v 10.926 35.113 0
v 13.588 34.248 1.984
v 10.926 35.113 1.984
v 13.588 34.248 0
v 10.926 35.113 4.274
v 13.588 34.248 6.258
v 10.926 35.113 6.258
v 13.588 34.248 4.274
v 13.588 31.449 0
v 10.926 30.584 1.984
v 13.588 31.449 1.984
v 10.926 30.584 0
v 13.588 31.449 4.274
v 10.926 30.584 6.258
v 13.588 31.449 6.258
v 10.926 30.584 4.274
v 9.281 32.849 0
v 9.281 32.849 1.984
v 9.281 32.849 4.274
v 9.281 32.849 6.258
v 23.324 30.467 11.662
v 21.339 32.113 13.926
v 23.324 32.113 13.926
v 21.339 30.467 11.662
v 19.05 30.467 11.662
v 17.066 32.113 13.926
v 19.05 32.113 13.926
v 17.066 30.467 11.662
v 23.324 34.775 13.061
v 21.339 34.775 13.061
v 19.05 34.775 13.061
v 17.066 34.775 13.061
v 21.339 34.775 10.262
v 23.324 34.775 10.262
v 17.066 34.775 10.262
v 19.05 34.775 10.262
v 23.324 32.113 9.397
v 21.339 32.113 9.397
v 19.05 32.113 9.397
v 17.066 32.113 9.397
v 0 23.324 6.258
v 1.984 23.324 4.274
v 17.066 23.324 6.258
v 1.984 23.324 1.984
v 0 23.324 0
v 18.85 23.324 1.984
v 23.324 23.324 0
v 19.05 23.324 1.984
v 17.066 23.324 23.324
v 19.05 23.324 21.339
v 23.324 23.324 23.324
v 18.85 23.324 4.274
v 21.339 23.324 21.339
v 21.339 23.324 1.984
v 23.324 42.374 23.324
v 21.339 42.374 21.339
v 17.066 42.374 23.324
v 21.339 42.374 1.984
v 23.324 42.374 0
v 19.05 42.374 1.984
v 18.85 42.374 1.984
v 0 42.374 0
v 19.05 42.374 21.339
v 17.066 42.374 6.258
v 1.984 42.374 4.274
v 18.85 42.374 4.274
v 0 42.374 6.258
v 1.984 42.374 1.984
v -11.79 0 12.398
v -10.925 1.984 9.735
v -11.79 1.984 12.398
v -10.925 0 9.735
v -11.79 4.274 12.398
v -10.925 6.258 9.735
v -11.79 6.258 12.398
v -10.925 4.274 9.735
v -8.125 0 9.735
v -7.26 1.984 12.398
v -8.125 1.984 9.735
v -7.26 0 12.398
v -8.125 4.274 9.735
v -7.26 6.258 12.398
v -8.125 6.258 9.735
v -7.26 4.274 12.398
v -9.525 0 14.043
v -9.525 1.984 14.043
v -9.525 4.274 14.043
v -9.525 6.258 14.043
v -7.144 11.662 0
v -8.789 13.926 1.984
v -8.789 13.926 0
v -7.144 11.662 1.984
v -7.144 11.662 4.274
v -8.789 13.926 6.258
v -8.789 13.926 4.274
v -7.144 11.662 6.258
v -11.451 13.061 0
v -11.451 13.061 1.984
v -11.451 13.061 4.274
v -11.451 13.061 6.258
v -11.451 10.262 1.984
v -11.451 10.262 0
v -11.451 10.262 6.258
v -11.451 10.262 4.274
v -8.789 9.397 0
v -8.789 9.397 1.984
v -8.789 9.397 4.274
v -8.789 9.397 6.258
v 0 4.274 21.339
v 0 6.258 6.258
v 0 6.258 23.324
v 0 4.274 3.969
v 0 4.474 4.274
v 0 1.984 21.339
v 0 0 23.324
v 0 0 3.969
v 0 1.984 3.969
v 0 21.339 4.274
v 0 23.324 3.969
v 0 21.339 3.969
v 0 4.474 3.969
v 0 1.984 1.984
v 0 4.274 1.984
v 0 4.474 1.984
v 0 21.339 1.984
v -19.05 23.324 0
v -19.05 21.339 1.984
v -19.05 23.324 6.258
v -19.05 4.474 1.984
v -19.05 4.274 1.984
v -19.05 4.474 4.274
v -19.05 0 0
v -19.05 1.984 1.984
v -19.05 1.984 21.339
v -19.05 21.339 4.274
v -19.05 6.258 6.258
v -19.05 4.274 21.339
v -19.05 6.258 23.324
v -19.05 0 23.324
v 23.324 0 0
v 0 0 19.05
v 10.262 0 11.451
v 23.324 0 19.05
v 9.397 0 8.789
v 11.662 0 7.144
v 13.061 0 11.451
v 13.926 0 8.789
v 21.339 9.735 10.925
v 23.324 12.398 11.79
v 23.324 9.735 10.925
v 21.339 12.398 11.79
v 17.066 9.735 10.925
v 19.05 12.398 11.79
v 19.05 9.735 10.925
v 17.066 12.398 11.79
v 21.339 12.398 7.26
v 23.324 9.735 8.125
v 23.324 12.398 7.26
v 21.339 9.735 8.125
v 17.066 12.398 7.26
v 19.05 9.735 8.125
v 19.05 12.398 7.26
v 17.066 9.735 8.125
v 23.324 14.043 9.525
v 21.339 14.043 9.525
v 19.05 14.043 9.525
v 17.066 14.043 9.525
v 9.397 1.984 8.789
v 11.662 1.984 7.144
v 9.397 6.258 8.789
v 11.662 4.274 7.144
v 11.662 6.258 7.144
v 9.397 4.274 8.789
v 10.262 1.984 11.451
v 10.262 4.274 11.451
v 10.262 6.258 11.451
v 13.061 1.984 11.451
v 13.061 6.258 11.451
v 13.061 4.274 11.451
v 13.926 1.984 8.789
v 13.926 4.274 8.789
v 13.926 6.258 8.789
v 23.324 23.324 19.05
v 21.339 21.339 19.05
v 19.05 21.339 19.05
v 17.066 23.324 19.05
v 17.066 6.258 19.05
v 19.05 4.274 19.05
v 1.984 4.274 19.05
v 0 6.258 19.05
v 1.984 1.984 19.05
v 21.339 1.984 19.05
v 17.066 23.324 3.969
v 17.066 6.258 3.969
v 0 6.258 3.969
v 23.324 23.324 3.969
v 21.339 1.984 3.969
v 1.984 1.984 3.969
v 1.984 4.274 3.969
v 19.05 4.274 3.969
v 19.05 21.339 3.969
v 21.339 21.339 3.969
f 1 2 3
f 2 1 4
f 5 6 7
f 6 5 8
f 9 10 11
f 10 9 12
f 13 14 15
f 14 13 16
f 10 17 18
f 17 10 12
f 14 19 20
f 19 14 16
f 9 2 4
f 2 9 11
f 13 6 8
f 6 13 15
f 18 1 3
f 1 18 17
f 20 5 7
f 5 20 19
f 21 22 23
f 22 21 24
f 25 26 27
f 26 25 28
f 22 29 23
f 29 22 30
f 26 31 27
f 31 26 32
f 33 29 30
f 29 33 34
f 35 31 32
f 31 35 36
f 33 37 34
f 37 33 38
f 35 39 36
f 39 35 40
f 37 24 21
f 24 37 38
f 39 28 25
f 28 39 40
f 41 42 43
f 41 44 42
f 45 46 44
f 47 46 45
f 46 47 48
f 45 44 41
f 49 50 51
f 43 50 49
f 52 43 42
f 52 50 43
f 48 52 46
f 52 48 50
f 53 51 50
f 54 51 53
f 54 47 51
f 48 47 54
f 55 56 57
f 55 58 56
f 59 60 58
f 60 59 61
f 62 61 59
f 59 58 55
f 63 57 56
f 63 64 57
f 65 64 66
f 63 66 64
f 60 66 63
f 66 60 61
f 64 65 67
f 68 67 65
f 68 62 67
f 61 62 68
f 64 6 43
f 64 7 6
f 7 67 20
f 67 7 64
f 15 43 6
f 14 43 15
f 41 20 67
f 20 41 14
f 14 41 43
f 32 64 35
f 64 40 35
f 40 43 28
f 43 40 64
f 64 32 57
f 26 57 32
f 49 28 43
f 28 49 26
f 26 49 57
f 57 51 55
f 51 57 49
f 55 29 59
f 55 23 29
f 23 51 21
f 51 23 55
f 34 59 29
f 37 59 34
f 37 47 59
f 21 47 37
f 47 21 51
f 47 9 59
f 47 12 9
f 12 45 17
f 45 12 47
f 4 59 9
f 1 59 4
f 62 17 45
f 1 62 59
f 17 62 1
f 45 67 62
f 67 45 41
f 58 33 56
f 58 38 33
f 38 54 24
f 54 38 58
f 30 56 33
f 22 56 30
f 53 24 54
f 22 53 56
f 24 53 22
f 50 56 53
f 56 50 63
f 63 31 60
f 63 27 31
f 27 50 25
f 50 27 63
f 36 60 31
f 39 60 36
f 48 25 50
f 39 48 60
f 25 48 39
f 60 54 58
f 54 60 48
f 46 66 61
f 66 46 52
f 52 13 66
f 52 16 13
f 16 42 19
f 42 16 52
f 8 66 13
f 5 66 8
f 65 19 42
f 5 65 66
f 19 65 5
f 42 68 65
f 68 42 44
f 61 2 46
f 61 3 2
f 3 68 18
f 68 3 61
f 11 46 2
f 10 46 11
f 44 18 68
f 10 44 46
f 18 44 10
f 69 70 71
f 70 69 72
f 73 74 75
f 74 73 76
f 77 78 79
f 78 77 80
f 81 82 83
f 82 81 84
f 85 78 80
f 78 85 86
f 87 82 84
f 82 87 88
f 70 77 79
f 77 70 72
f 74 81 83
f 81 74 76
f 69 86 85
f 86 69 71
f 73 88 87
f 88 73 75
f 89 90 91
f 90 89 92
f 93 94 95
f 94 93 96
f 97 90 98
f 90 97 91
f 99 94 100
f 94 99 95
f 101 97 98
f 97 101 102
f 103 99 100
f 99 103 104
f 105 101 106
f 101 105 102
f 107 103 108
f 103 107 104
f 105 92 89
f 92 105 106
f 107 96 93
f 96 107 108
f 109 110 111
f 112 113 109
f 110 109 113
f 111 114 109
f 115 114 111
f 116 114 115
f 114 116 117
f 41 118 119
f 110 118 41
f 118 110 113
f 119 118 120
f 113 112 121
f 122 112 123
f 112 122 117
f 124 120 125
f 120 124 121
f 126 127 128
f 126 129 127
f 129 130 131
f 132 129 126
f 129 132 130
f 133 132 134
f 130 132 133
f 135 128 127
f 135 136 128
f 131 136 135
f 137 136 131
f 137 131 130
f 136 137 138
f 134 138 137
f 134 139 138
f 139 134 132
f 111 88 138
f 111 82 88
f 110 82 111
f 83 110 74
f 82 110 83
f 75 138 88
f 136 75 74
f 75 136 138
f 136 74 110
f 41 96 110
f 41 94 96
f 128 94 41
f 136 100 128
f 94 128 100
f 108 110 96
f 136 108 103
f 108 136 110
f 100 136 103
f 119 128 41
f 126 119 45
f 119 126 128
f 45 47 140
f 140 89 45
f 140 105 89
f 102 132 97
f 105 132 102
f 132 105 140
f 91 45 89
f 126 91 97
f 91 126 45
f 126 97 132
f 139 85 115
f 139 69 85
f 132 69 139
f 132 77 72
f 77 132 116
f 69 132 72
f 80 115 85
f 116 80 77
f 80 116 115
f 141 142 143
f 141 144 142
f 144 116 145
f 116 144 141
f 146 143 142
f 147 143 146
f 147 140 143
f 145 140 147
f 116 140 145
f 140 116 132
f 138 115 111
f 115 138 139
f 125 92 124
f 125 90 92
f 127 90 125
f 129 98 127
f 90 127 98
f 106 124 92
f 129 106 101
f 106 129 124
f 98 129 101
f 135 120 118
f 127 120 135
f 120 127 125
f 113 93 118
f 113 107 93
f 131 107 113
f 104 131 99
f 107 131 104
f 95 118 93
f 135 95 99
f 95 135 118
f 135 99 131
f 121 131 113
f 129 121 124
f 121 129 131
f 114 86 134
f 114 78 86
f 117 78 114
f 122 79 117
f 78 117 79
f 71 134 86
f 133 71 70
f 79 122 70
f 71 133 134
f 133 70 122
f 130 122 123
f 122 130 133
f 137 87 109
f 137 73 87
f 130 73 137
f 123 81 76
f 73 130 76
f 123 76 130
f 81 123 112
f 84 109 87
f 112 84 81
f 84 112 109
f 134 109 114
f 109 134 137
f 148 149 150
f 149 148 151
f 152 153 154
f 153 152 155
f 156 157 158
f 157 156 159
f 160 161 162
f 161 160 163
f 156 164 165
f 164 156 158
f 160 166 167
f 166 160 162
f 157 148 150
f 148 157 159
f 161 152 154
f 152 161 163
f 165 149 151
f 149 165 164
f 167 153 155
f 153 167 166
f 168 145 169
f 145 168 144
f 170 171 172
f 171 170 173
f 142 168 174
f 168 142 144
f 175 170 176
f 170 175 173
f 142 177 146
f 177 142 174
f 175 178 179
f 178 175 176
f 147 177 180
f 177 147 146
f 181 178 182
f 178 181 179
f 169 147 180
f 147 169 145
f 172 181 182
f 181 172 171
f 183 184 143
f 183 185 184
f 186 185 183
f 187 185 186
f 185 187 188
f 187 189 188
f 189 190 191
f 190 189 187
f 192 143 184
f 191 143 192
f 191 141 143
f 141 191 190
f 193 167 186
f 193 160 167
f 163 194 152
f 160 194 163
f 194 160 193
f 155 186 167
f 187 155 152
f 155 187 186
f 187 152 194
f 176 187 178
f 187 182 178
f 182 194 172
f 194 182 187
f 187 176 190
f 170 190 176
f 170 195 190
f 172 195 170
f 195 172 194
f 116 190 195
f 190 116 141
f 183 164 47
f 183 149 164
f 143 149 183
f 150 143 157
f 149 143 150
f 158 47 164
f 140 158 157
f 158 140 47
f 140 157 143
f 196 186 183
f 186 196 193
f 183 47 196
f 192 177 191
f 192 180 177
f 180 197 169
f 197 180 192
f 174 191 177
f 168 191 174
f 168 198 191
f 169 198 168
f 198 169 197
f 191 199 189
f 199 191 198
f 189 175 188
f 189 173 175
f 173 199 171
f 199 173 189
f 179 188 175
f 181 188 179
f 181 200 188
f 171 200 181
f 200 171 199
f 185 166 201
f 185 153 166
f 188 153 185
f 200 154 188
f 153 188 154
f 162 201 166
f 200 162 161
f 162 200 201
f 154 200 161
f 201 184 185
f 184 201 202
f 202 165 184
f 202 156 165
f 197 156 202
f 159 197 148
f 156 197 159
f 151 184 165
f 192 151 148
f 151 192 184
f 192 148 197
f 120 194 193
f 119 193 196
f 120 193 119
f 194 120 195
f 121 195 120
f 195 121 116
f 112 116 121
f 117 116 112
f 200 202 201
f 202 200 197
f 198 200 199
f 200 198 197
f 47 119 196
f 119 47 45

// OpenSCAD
// 5/64ths
// 3/4
// 3/4

// Which part to print
part = "corner"; // [corner:Corner, beamRest:Beam rest]

// How round should the holes be?
ROUNDNESS=5; //[0:50]

units = "in"; //[in:Inches, mm:mm]

conversion = (units=="in")?25.4:1;


// This is the size of each of the legs of the beam
beamWidth = .75;

// This is the thickness of the beam (5/64)
thicknessOfBeam = 0.078125;

// how thick should the walls be? (5/64)
wallThickness = 0.078125;

// spacing between parts
printerTolerance = .006;

beamThickness = thicknessOfBeam * conversion;
beamSize = beamWidth * conversion;
// sorry, mm only
tolerance = printerTolerance * conversion;

thickness = wallThickness * conversion;

// depth of the pieces
pieceDepth = .75;
depth = pieceDepth * conversion;

// radius of the hole
holeSize = 0.09375;
holeRad = holeSize * conversion;

// The amount of overhang on the beam rest
overhang = 1;

module connector(connectorDepth = depth, support1 = false, support2 = false)
{
    difference(){
        linear_extrude(connectorDepth)
        {
                polygon(points=[[0,0], [beamSize + 2*(tolerance + thickness), 0],
            [beamSize + 2 * (tolerance + thickness), beamThickness + 2* (thickness + tolerance)],
            [2*(tolerance + thickness) + beamThickness, beamThickness + 2* (thickness + tolerance)],
            [2*(tolerance + thickness) + beamThickness, 2*(tolerance + thickness) + beamSize],
            [0,2*(tolerance + thickness) + beamSize],
            
            [thickness, thickness], [thickness + beamSize + 2 * tolerance, thickness],
            [thickness + beamSize + 2 * tolerance, thickness + 2 * tolerance + beamThickness],
            [thickness + 2 * tolerance + beamThickness, thickness + 2 * tolerance + beamThickness],
            [thickness + 2 * tolerance + beamThickness, 2 * tolerance + beamSize + thickness],
            [thickness, 2 * tolerance + beamSize + thickness]], paths=[[0,1,2,3,4,5], [6,7,8,9,10,11]]);
            
            if(support1)
            {
                translate([thickness + 2 * tolerance + beamThickness, thickness-.5, 0])
                    square(size=[.2, beamThickness+2*tolerance+1]);
                //translate([2*(thickness + tolerance) + beamThickness, thickness-.5, 0])
                 //   square(size=[.2, beamThickness+2*tolerance+1]);
            }
            if(support2)
            {
                translate([thickness-.5, thickness + 2 * tolerance + beamThickness, 0])
                    square(size=[beamThickness+2*tolerance+1, .2]);
                //translate([thickness-.5, 2 * (thickness + tolerance) + beamThickness, 0])
                //    square(size=[beamThickness+2*tolerance+1, .2]);
            }
        }
            
        if(holeRad > 0)
        {
            // holes
            translate([(beamSize + 2 * (tolerance + thickness))/2,-.5,connectorDepth/2])
                rotate([-90,0,0])cylinder(h=beamThickness + 2* (thickness + tolerance)+1, r=holeRad, $fn=ROUNDNESS);
                    
            translate([-.5,(beamSize + 2 * (tolerance + thickness))/2,connectorDepth/2])
                rotate([0,90,0])cylinder(h=beamThickness + 2* (thickness + tolerance)+1, r=holeRad, $fn=ROUNDNESS);
        }
    }
}
module angleBracket()
{
    cubeSize = beamSize + 2 * (tolerance+thickness);
translate([cubeSize,cubeSize,0])rotate([90,0,180])connector(support1 = true);
translate([0,0,0])rotate([0,-90,0])connector(support2 = true);
translate([cubeSize,0,0])rotate([0,0,90])connector();
    cube(size=[cubeSize, cubeSize, 2*thickness]);
}



module beamRest(length = 25)
{
    // sqrt(a * a + a * a) = sqrt(2) * a
    width = sqrt(2)*(depth+2*(thickness + tolerance));
    
    connector(connectorDepth=width);
    translate([beamSize + thickness + 2*tolerance,0,0]){
        cube(size=[length,2*(thickness+tolerance) + beamThickness, width]);
    }
    translate([beamSize + thickness+tolerance, -2*thickness, 0])
        cube(size=[length, 3*thickness, thickness]);
    
    translate([beamSize + thickness+tolerance, -2*thickness, width -thickness ])
        cube(size=[length, 3*thickness, thickness]);
    
    //crossbeam
    translate([beamSize + thickness+tolerance, -2*thickness, 0])
        cube(size=[thickness, thickness, width]);
}

module ring(id, od, depth)
{
    difference()
    {
        cylinder(r=od, h=depth, $fn=ROUNDNESS);
        translate([0,0,-1])cylinder(r=id, h=depth+2, $fn=ROUNDNESS);
    }
}

if(part == "beamRest")
{
    beamRest(length = overhang * conversion);
}

if(part == "corner" || pieceToPrint == "all")
{
    angleBracket();
}




